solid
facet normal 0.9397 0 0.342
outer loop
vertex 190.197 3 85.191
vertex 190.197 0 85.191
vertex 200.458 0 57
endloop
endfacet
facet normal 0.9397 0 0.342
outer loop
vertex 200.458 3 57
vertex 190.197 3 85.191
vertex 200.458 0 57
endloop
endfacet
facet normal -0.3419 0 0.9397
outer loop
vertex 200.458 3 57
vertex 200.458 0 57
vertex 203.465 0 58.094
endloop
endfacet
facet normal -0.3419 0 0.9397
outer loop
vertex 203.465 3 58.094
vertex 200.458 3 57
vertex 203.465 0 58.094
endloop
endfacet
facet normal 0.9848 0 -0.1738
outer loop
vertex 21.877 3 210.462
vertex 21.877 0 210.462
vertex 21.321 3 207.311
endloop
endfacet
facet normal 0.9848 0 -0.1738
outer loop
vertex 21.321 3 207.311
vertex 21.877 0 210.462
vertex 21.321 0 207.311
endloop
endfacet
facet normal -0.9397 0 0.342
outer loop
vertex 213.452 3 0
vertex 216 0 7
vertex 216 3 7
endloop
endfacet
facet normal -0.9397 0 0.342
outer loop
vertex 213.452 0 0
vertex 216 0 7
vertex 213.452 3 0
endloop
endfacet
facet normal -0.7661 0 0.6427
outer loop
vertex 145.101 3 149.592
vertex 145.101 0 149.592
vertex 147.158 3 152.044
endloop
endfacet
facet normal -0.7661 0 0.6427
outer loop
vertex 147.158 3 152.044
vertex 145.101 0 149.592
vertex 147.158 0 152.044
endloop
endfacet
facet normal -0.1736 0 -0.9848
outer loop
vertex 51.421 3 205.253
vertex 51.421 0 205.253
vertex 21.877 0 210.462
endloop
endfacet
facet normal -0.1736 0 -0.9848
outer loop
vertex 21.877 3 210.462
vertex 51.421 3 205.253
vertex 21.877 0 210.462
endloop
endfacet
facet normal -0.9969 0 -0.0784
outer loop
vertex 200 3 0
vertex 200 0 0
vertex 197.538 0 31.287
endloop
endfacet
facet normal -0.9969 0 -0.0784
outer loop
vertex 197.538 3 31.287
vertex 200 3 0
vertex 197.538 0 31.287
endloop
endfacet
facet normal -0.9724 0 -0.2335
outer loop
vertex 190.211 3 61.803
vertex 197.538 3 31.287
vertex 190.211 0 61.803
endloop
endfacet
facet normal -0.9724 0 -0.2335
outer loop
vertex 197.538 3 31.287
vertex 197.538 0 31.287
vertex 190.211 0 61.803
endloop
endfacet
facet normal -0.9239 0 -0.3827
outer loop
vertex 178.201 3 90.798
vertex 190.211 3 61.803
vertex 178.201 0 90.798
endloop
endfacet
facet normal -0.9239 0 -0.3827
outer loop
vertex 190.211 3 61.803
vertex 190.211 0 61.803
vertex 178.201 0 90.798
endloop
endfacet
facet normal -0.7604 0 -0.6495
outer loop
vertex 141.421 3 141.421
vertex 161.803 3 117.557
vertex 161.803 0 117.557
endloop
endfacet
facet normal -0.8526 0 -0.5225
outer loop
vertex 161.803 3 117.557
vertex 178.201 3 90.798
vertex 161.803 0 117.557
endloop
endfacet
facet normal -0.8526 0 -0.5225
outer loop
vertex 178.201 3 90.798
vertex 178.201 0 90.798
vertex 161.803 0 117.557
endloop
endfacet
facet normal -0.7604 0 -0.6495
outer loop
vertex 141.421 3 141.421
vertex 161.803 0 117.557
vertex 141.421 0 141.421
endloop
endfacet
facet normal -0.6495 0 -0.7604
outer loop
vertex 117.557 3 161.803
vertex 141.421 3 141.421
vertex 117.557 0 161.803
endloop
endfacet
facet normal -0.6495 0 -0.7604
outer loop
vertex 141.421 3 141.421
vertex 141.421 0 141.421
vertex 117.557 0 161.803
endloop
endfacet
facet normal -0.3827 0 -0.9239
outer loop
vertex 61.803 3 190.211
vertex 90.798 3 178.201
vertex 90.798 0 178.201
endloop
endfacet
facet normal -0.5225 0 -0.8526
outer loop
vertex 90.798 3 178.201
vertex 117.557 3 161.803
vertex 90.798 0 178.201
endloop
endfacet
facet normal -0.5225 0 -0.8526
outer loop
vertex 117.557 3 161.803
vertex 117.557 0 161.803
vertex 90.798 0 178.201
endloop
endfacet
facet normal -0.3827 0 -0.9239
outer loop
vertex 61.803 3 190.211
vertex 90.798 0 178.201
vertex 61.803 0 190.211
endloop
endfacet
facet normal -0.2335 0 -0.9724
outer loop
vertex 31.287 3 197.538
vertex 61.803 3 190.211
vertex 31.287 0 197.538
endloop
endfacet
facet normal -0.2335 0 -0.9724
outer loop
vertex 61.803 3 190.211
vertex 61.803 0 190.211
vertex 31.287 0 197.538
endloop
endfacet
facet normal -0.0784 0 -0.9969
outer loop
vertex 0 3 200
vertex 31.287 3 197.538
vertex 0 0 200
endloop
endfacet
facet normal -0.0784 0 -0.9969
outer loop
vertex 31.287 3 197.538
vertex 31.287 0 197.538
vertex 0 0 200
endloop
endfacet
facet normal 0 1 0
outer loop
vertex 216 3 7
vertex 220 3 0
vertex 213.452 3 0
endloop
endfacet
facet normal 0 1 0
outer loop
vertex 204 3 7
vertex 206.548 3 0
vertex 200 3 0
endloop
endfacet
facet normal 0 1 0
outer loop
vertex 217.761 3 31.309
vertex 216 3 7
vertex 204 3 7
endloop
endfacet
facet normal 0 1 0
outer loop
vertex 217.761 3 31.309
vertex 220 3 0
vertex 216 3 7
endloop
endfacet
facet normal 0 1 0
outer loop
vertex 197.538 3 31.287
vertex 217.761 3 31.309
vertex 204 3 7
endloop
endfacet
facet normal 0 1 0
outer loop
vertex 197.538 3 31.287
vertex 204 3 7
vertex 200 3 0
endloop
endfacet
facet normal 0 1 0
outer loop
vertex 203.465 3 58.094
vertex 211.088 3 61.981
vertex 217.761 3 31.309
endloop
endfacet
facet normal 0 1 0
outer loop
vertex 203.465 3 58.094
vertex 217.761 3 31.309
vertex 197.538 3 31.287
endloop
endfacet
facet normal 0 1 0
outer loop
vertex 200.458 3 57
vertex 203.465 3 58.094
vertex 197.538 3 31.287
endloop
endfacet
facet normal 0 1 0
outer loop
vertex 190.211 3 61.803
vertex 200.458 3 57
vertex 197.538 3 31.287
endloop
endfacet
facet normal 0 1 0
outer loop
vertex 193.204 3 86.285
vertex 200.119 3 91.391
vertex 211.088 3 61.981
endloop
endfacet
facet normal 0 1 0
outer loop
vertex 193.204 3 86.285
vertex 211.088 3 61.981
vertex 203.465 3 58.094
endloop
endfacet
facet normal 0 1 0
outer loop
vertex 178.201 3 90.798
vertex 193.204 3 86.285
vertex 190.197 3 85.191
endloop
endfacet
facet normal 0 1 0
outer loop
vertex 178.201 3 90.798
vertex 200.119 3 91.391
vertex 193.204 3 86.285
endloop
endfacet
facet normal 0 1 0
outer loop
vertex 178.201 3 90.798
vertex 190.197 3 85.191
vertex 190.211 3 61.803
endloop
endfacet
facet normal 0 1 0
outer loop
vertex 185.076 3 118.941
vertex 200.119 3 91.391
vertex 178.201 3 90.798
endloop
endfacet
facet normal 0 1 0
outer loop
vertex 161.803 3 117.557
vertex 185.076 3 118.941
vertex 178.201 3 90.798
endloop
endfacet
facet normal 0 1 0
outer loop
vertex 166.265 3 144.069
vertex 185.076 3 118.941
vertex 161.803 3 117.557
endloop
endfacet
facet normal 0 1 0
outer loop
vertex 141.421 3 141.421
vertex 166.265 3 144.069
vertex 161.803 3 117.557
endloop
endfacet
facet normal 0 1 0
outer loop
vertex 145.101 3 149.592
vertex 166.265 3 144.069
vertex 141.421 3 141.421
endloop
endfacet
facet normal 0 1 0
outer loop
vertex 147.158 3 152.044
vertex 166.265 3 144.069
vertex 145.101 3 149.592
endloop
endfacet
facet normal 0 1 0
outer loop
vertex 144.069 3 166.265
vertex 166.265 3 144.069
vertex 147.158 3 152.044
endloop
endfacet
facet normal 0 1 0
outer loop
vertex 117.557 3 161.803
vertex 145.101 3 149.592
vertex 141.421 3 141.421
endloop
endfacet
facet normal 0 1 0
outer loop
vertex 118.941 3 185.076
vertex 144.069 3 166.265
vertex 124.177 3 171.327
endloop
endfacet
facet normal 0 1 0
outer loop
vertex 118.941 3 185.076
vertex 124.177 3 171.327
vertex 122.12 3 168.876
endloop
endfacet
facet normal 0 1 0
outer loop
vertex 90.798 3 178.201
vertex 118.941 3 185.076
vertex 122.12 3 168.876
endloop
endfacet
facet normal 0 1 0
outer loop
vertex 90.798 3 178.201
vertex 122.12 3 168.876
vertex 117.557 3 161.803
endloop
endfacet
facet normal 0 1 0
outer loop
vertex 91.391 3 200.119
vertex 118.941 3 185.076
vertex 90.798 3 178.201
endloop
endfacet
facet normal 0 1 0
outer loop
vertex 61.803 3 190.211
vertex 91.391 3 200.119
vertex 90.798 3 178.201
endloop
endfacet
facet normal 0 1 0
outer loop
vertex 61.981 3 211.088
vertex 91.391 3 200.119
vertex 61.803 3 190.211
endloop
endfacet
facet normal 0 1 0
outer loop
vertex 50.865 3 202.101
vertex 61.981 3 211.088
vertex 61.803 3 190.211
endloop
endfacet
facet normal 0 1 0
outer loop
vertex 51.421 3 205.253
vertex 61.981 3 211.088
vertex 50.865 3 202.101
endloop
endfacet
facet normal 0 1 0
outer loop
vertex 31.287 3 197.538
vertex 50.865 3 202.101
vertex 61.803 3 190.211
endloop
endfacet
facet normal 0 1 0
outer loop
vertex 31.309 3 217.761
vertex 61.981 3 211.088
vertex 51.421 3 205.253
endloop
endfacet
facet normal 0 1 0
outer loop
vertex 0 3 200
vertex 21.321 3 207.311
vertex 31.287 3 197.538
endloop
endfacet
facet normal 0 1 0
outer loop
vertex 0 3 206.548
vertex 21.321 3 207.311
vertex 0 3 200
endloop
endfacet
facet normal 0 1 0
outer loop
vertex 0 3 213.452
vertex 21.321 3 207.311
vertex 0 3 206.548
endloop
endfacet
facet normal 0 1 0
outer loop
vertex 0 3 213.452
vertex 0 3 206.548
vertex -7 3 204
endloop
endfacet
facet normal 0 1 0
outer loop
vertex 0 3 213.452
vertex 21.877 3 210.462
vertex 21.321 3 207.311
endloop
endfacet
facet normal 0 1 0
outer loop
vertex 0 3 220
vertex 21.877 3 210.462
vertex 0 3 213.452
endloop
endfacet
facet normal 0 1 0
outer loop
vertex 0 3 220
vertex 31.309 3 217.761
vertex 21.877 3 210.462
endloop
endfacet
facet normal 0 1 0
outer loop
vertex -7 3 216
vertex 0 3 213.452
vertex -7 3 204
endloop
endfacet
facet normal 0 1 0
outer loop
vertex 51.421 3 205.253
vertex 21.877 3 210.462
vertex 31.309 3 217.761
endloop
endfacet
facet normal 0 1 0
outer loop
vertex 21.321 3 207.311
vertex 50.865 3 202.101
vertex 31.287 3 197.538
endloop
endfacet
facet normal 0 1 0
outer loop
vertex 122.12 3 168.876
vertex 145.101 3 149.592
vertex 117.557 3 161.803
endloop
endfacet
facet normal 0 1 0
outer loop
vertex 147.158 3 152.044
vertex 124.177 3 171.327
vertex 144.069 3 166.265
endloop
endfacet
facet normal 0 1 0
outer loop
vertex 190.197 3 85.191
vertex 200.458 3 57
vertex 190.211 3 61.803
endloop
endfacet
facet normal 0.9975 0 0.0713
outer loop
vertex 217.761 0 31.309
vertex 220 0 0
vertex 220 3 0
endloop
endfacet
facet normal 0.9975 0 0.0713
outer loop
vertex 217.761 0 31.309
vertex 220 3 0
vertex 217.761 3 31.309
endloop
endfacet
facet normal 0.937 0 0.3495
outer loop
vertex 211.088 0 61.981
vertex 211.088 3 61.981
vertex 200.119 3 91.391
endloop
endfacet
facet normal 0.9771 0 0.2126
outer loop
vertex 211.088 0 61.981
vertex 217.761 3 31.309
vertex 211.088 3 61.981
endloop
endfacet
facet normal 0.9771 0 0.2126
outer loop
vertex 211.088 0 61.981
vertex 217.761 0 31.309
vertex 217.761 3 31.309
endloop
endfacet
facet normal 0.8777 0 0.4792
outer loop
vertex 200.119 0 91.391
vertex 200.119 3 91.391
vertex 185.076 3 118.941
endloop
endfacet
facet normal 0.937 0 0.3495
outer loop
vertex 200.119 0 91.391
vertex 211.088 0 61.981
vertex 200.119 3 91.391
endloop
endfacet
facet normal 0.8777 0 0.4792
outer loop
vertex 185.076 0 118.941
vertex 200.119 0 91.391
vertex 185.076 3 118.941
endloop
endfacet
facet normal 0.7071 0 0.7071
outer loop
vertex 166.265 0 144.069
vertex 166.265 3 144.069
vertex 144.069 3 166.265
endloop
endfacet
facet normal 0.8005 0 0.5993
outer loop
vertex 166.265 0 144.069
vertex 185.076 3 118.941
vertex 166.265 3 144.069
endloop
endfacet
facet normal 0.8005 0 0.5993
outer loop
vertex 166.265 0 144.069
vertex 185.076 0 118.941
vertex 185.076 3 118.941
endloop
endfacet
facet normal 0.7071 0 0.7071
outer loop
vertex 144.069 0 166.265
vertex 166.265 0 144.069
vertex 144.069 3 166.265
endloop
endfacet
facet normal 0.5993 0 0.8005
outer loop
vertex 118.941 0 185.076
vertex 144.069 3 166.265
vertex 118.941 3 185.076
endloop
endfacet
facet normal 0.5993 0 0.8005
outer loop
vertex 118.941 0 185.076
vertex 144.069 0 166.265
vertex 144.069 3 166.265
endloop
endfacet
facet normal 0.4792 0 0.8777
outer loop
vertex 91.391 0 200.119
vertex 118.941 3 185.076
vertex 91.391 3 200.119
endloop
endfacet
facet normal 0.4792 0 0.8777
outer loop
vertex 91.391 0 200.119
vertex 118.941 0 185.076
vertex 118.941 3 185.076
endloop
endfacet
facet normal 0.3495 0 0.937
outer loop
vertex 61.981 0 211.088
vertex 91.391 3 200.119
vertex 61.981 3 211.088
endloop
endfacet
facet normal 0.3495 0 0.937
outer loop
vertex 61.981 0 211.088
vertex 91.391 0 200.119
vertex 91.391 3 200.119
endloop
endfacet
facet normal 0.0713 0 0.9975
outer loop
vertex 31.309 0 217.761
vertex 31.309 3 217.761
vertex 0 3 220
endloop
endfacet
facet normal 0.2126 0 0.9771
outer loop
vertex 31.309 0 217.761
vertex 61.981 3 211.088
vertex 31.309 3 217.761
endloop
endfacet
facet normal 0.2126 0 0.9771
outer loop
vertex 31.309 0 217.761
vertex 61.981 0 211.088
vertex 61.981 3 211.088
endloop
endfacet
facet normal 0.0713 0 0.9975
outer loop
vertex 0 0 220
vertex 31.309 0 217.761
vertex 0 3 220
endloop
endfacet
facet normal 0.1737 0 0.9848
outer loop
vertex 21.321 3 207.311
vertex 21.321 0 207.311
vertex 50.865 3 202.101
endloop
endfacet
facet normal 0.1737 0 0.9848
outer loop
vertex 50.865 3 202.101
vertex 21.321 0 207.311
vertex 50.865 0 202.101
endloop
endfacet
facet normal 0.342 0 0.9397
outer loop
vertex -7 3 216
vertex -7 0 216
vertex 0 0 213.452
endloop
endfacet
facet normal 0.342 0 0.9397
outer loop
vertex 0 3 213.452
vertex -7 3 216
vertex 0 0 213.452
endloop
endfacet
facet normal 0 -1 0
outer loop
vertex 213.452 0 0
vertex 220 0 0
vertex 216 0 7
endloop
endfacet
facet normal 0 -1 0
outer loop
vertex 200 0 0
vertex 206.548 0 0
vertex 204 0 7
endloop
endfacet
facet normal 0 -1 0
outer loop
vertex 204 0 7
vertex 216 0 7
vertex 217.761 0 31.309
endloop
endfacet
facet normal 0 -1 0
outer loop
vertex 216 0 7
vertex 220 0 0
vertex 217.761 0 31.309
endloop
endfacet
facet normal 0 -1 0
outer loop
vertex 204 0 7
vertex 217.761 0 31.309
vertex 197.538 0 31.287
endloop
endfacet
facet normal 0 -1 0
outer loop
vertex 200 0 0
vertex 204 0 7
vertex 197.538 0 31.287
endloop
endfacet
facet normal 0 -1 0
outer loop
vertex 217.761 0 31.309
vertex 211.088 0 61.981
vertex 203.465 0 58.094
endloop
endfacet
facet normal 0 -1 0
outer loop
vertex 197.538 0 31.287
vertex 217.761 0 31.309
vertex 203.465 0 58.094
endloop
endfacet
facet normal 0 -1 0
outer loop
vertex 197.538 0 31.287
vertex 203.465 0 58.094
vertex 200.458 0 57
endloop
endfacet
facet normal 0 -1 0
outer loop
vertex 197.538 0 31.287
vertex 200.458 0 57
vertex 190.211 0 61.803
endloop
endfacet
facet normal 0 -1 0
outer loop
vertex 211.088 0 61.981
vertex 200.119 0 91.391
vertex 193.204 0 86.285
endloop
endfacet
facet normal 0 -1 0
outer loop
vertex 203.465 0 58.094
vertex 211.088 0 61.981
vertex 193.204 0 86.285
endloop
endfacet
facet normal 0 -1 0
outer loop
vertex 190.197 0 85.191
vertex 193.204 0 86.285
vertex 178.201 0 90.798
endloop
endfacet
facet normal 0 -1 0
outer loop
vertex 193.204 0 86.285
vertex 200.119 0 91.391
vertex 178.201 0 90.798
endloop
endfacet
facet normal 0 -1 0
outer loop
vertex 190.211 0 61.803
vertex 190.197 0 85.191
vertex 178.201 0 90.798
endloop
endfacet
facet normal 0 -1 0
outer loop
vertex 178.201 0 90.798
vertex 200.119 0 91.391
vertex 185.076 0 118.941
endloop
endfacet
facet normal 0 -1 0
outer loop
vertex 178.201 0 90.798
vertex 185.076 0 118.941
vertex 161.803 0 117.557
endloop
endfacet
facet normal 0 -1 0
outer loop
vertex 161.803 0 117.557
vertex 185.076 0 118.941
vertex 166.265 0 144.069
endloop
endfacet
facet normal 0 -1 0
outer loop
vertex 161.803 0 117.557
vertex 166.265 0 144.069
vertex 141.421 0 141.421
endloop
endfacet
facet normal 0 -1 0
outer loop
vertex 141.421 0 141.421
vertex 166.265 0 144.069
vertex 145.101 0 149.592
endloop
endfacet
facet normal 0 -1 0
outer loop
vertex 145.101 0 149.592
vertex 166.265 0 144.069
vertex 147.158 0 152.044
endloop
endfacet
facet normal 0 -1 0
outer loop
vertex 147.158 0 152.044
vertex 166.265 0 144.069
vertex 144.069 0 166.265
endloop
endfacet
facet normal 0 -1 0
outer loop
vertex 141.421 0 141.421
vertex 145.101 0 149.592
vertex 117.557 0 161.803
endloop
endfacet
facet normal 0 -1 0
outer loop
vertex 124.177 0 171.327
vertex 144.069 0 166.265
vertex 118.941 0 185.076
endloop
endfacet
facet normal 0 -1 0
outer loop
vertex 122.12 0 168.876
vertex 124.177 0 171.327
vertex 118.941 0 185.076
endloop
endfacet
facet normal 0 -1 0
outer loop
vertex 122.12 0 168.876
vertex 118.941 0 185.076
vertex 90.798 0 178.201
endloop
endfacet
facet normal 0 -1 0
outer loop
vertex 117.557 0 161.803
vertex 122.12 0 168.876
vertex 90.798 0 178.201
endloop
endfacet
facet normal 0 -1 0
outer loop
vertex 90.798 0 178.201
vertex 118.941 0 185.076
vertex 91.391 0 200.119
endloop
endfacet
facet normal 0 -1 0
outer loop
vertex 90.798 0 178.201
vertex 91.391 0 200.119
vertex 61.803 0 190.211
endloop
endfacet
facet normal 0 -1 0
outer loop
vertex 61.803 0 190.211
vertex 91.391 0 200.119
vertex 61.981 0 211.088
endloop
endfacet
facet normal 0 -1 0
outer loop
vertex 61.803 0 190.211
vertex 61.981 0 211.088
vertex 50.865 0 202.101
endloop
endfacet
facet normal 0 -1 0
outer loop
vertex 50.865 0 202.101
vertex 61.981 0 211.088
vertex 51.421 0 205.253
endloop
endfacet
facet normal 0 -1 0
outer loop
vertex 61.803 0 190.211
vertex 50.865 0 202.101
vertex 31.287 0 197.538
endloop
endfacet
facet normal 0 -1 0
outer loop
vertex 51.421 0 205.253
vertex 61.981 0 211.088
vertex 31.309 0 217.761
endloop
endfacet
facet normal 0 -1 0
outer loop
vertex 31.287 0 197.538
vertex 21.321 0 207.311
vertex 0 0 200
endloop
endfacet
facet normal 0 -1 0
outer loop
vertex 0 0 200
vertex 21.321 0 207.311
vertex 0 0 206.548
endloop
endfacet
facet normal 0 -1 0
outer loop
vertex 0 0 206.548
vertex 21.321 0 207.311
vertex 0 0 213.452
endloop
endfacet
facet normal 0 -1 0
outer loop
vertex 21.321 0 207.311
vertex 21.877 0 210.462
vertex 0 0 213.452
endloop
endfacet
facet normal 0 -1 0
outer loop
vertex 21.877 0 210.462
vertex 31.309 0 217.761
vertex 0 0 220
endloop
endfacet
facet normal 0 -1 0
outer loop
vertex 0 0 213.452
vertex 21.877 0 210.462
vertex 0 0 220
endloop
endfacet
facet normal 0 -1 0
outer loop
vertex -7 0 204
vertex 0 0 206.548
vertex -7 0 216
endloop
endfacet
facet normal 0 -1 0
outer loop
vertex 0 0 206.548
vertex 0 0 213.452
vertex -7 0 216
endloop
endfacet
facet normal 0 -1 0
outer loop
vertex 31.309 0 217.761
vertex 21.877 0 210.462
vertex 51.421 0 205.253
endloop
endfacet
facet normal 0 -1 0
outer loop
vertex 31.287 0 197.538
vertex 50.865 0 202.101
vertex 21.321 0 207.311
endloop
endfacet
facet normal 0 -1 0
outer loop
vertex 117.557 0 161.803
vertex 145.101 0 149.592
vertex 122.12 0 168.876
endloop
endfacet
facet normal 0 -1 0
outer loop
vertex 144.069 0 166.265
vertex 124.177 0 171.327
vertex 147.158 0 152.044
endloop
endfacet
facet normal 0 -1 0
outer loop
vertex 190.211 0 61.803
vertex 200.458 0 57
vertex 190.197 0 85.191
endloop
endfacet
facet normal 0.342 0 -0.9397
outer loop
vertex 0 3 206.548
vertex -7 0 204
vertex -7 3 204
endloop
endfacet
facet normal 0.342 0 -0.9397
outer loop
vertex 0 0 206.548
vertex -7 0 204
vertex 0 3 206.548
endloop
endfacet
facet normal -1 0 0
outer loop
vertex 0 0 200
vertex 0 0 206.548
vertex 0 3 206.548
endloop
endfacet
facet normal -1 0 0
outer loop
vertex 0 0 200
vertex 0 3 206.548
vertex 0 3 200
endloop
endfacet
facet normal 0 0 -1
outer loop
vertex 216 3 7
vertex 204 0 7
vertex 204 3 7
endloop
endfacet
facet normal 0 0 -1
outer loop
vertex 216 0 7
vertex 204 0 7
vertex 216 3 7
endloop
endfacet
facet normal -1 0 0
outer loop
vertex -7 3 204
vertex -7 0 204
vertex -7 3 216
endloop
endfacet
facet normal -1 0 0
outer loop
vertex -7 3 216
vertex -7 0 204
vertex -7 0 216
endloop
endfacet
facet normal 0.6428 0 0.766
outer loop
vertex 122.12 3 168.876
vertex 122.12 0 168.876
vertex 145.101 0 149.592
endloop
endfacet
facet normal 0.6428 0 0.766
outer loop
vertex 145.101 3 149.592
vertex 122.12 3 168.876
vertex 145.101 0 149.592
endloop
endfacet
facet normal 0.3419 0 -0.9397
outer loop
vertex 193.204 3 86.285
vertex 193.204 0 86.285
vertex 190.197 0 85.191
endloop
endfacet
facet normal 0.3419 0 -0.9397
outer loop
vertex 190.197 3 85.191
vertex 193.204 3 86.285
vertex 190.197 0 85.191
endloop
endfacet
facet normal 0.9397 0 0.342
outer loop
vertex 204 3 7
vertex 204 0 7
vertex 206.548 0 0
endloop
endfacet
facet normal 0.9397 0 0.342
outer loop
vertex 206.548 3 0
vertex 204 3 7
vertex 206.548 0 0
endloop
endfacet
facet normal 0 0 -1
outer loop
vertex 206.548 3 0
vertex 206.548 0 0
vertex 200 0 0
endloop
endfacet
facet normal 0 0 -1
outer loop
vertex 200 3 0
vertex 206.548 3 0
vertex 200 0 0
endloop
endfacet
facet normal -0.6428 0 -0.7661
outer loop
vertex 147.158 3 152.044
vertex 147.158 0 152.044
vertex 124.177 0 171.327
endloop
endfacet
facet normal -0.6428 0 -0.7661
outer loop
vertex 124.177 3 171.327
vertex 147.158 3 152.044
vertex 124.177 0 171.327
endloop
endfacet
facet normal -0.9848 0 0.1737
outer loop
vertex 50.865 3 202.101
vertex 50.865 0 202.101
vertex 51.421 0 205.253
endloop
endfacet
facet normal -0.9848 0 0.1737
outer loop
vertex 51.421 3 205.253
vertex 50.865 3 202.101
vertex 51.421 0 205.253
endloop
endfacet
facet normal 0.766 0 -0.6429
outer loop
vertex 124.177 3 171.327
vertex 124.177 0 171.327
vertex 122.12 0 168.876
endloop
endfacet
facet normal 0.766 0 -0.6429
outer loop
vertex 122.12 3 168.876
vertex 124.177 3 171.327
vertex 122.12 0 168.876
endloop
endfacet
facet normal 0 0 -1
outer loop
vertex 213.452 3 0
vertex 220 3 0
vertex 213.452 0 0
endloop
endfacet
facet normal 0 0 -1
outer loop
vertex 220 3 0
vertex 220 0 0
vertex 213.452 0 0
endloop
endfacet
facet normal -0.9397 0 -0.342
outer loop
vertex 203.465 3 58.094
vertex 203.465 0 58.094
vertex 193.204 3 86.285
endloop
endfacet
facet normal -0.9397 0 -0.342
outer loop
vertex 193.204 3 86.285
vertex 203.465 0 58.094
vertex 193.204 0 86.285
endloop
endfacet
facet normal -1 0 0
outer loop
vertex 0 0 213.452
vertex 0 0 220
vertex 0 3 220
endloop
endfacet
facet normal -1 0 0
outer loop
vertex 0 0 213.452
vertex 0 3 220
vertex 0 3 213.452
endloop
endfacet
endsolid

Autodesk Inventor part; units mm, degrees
ref_plane "YZ Plane" through (0, 0, 0) normal (1, 0, 0) x (0, 1, 0)
ref_plane "XZ Plane" through (0, 0, 0) normal (0, 1, 0) x (-1, 0, 0)
ref_plane "XY Plane" through (0, 0, 0) normal (0, 0, 1) x (1, 0, 0)
sketch "Sketch1" plane through (0, 0, 0) normal (0, 1, 0) x (-1, 0, 0)
  circle A0 centre (0, 0) radius 200
  circle A1 centre (0, 0) radius 220
  line L0 (220, 0) -> (200, 0)
  line L1 (-220, 0) -> (-200, 0)
  line L2 (0, 0) -> (-200, 0) construction
  line L3 (0, 200) -> (0, 0) construction
  line L4 (0, 220) -> (0, 200)
  line L5 (-200, 0) -> (-220, 0)
  line L6 (-204, 7) -> (-216, 7)
  line L7 (-216, 7) -> (-213.4522, 0)
  line L8 (-204, 7) -> (-206.5478, 0)
  line L9 (-210, 0) -> (-210, 7) construction
  line L10 (-203.4647, 58.0945) -> (-193.2038, 86.2852)
  line L11 (-193.2038, 86.2852) -> (-190.1968, 85.1907)
  line L12 (-190.1968, 85.1907) -> (-200.4577, 57)
  line L13 (-200.4577, 57) -> (-203.4647, 58.0945)
  line L14 (-203.4647, 58.0945) -> (-190.1968, 85.1907) construction
  line L15 (-193.2038, 86.2852) -> (-200.4577, 57) construction
  circle A2 centre (0, 0) radius 210 construction
  line L16 (-7, -204) -> (0, -206.5478)
  line L17 (-7, -216) -> (0, -213.4522)
  line L18 (-7, -204) -> (-7, -216)
  line L19 (204, -7) -> (206.5478, 0)
  line L20 (216, -7) -> (213.4522, 0)
  line L21 (204, -7) -> (216, -7)
  line L22 (7, 204) -> (0, 206.5478)
  line L23 (7, 216) -> (0, 213.4522)
  line L24 (7, 204) -> (7, 216)
  line L25 (-205.2528, -51.421) -> (-210.462, -21.8768)
  line L26 (-202.1014, -50.8654) -> (-205.2528, -51.421)
  line L27 (-207.3106, -21.3211) -> (-202.1014, -50.8654)
  line L28 (-210.462, -21.8768) -> (-207.3106, -21.3211)
  line L29 (-152.0436, -147.1583) -> (-171.3271, -124.1768)
  line L30 (-149.5923, -145.1014) -> (-152.0436, -147.1583)
  line L31 (-168.8757, -122.1199) -> (-149.5923, -145.1014)
  line L32 (-171.3271, -124.1768) -> (-168.8757, -122.1199)
  line L33 (-58.0945, -203.4647) -> (-86.2852, -193.2038)
  line L34 (-57, -200.4577) -> (-58.0945, -203.4647)
  line L35 (-85.1907, -190.1968) -> (-57, -200.4577)
  line L36 (-86.2852, -193.2038) -> (-85.1907, -190.1968)
  line L37 (51.421, -205.2528) -> (21.8768, -210.462)
  line L38 (50.8654, -202.1014) -> (51.421, -205.2528)
  line L39 (21.3211, -207.3106) -> (50.8654, -202.1014)
  line L40 (21.8768, -210.462) -> (21.3211, -207.3106)
  line L41 (147.1583, -152.0436) -> (124.1768, -171.3271)
  line L42 (145.1014, -149.5923) -> (147.1583, -152.0436)
  line L43 (122.1199, -168.8757) -> (145.1014, -149.5923)
  line L44 (124.1768, -171.3271) -> (122.1199, -168.8757)
  line L45 (203.4647, -58.0945) -> (193.2038, -86.2852)
  line L46 (200.4577, -57) -> (203.4647, -58.0945)
  line L47 (190.1968, -85.1907) -> (200.4577, -57)
  line L48 (193.2038, -86.2852) -> (190.1968, -85.1907)
  line L49 (205.2528, 51.421) -> (210.462, 21.8768)
  line L50 (202.1014, 50.8654) -> (205.2528, 51.421)
  line L51 (207.3106, 21.3211) -> (202.1014, 50.8654)
  line L52 (210.462, 21.8768) -> (207.3106, 21.3211)
  line L53 (152.0436, 147.1583) -> (171.3271, 124.1768)
  line L54 (149.5923, 145.1014) -> (152.0436, 147.1583)
  line L55 (168.8757, 122.1199) -> (149.5923, 145.1014)
  line L56 (171.3271, 124.1768) -> (168.8757, 122.1199)
  line L57 (58.0945, 203.4647) -> (86.2852, 193.2038)
  line L58 (57, 200.4577) -> (58.0945, 203.4647)
  line L59 (85.1907, 190.1968) -> (57, 200.4577)
  line L60 (86.2852, 193.2038) -> (85.1907, 190.1968)
  line L61 (-51.421, 205.2528) -> (-21.8768, 210.462)
  line L62 (-50.8654, 202.1014) -> (-51.421, 205.2528)
  line L63 (-21.3211, 207.3106) -> (-50.8654, 202.1014)
  line L64 (-21.8768, 210.462) -> (-21.3211, 207.3106)
  line L65 (-147.1583, 152.0436) -> (-124.1768, 171.3271)
  line L66 (-145.1014, 149.5923) -> (-147.1583, 152.0436)
  line L67 (-122.1199, 168.8757) -> (-145.1014, 149.5923)
  line L68 (-124.1768, 171.3271) -> (-122.1199, 168.8757)
  point P0 (210, 0)
  point P1 (-210, 0)
  point P2 (-196.8307, 71.6426)
  point P3 (-40.1486, 206.1264)
  point P4 (-201.9612, 57.5472)
  point P5 (-191.7003, 85.7379)
  point P6 (-7, -210)
  point P7 (210, -7)
  point P8 (7, 210)
  point P9 (-203.6771, -51.1432)
  point P10 (-208.8863, -21.5989)
  point P11 (-150.818, -146.1299)
  point P12 (-170.1014, -123.1484)
  point P13 (-57.5472, -201.9612)
  point P14 (-85.7379, -191.7003)
  point P15 (51.1432, -203.6771)
  point P16 (21.5989, -208.8863)
  point P17 (146.1299, -150.818)
  point P18 (123.1484, -170.1014)
  point P19 (201.9612, -57.5472)
  point P20 (191.7003, -85.7379)
  point P21 (203.6771, 51.1432)
  point P22 (208.8863, 21.5989)
  point P23 (150.818, 146.1299)
  point P24 (170.1014, 123.1484)
  point P25 (57.5472, 201.9612)
  point P26 (85.7379, 191.7003)
  point P27 (-51.1432, 203.6771)
  point P28 (-21.5989, 208.8863)
  point P29 (-146.1299, 150.818)
  point P30 (-123.1484, 170.1014)
  point P31 (-206.5478, 0)
  point P32 (0, 206.5478)
  point P33 (0, 213.4522)
  dimension "d0" = 400
  dimension "d1" = 440
  dimension "d4" = 90
  dimension "d5" = 7
  dimension "d6" = 70
  dimension "d8" = 12
  dimension "d13" = 3.2
  dimension "d14" = 30
  dimension "d15" = 50
  dimension "d20" = 420
  dimension "d23" = 360
  dimension "d27" = 360
extrude "Extrusion1" add sketch "Sketch1" along normal blind 3 contours A0 L1 L8 L6 L7 A1 L4 | L4 L23 L24 L22
properties part number "R40_CM_CIRCULO"
